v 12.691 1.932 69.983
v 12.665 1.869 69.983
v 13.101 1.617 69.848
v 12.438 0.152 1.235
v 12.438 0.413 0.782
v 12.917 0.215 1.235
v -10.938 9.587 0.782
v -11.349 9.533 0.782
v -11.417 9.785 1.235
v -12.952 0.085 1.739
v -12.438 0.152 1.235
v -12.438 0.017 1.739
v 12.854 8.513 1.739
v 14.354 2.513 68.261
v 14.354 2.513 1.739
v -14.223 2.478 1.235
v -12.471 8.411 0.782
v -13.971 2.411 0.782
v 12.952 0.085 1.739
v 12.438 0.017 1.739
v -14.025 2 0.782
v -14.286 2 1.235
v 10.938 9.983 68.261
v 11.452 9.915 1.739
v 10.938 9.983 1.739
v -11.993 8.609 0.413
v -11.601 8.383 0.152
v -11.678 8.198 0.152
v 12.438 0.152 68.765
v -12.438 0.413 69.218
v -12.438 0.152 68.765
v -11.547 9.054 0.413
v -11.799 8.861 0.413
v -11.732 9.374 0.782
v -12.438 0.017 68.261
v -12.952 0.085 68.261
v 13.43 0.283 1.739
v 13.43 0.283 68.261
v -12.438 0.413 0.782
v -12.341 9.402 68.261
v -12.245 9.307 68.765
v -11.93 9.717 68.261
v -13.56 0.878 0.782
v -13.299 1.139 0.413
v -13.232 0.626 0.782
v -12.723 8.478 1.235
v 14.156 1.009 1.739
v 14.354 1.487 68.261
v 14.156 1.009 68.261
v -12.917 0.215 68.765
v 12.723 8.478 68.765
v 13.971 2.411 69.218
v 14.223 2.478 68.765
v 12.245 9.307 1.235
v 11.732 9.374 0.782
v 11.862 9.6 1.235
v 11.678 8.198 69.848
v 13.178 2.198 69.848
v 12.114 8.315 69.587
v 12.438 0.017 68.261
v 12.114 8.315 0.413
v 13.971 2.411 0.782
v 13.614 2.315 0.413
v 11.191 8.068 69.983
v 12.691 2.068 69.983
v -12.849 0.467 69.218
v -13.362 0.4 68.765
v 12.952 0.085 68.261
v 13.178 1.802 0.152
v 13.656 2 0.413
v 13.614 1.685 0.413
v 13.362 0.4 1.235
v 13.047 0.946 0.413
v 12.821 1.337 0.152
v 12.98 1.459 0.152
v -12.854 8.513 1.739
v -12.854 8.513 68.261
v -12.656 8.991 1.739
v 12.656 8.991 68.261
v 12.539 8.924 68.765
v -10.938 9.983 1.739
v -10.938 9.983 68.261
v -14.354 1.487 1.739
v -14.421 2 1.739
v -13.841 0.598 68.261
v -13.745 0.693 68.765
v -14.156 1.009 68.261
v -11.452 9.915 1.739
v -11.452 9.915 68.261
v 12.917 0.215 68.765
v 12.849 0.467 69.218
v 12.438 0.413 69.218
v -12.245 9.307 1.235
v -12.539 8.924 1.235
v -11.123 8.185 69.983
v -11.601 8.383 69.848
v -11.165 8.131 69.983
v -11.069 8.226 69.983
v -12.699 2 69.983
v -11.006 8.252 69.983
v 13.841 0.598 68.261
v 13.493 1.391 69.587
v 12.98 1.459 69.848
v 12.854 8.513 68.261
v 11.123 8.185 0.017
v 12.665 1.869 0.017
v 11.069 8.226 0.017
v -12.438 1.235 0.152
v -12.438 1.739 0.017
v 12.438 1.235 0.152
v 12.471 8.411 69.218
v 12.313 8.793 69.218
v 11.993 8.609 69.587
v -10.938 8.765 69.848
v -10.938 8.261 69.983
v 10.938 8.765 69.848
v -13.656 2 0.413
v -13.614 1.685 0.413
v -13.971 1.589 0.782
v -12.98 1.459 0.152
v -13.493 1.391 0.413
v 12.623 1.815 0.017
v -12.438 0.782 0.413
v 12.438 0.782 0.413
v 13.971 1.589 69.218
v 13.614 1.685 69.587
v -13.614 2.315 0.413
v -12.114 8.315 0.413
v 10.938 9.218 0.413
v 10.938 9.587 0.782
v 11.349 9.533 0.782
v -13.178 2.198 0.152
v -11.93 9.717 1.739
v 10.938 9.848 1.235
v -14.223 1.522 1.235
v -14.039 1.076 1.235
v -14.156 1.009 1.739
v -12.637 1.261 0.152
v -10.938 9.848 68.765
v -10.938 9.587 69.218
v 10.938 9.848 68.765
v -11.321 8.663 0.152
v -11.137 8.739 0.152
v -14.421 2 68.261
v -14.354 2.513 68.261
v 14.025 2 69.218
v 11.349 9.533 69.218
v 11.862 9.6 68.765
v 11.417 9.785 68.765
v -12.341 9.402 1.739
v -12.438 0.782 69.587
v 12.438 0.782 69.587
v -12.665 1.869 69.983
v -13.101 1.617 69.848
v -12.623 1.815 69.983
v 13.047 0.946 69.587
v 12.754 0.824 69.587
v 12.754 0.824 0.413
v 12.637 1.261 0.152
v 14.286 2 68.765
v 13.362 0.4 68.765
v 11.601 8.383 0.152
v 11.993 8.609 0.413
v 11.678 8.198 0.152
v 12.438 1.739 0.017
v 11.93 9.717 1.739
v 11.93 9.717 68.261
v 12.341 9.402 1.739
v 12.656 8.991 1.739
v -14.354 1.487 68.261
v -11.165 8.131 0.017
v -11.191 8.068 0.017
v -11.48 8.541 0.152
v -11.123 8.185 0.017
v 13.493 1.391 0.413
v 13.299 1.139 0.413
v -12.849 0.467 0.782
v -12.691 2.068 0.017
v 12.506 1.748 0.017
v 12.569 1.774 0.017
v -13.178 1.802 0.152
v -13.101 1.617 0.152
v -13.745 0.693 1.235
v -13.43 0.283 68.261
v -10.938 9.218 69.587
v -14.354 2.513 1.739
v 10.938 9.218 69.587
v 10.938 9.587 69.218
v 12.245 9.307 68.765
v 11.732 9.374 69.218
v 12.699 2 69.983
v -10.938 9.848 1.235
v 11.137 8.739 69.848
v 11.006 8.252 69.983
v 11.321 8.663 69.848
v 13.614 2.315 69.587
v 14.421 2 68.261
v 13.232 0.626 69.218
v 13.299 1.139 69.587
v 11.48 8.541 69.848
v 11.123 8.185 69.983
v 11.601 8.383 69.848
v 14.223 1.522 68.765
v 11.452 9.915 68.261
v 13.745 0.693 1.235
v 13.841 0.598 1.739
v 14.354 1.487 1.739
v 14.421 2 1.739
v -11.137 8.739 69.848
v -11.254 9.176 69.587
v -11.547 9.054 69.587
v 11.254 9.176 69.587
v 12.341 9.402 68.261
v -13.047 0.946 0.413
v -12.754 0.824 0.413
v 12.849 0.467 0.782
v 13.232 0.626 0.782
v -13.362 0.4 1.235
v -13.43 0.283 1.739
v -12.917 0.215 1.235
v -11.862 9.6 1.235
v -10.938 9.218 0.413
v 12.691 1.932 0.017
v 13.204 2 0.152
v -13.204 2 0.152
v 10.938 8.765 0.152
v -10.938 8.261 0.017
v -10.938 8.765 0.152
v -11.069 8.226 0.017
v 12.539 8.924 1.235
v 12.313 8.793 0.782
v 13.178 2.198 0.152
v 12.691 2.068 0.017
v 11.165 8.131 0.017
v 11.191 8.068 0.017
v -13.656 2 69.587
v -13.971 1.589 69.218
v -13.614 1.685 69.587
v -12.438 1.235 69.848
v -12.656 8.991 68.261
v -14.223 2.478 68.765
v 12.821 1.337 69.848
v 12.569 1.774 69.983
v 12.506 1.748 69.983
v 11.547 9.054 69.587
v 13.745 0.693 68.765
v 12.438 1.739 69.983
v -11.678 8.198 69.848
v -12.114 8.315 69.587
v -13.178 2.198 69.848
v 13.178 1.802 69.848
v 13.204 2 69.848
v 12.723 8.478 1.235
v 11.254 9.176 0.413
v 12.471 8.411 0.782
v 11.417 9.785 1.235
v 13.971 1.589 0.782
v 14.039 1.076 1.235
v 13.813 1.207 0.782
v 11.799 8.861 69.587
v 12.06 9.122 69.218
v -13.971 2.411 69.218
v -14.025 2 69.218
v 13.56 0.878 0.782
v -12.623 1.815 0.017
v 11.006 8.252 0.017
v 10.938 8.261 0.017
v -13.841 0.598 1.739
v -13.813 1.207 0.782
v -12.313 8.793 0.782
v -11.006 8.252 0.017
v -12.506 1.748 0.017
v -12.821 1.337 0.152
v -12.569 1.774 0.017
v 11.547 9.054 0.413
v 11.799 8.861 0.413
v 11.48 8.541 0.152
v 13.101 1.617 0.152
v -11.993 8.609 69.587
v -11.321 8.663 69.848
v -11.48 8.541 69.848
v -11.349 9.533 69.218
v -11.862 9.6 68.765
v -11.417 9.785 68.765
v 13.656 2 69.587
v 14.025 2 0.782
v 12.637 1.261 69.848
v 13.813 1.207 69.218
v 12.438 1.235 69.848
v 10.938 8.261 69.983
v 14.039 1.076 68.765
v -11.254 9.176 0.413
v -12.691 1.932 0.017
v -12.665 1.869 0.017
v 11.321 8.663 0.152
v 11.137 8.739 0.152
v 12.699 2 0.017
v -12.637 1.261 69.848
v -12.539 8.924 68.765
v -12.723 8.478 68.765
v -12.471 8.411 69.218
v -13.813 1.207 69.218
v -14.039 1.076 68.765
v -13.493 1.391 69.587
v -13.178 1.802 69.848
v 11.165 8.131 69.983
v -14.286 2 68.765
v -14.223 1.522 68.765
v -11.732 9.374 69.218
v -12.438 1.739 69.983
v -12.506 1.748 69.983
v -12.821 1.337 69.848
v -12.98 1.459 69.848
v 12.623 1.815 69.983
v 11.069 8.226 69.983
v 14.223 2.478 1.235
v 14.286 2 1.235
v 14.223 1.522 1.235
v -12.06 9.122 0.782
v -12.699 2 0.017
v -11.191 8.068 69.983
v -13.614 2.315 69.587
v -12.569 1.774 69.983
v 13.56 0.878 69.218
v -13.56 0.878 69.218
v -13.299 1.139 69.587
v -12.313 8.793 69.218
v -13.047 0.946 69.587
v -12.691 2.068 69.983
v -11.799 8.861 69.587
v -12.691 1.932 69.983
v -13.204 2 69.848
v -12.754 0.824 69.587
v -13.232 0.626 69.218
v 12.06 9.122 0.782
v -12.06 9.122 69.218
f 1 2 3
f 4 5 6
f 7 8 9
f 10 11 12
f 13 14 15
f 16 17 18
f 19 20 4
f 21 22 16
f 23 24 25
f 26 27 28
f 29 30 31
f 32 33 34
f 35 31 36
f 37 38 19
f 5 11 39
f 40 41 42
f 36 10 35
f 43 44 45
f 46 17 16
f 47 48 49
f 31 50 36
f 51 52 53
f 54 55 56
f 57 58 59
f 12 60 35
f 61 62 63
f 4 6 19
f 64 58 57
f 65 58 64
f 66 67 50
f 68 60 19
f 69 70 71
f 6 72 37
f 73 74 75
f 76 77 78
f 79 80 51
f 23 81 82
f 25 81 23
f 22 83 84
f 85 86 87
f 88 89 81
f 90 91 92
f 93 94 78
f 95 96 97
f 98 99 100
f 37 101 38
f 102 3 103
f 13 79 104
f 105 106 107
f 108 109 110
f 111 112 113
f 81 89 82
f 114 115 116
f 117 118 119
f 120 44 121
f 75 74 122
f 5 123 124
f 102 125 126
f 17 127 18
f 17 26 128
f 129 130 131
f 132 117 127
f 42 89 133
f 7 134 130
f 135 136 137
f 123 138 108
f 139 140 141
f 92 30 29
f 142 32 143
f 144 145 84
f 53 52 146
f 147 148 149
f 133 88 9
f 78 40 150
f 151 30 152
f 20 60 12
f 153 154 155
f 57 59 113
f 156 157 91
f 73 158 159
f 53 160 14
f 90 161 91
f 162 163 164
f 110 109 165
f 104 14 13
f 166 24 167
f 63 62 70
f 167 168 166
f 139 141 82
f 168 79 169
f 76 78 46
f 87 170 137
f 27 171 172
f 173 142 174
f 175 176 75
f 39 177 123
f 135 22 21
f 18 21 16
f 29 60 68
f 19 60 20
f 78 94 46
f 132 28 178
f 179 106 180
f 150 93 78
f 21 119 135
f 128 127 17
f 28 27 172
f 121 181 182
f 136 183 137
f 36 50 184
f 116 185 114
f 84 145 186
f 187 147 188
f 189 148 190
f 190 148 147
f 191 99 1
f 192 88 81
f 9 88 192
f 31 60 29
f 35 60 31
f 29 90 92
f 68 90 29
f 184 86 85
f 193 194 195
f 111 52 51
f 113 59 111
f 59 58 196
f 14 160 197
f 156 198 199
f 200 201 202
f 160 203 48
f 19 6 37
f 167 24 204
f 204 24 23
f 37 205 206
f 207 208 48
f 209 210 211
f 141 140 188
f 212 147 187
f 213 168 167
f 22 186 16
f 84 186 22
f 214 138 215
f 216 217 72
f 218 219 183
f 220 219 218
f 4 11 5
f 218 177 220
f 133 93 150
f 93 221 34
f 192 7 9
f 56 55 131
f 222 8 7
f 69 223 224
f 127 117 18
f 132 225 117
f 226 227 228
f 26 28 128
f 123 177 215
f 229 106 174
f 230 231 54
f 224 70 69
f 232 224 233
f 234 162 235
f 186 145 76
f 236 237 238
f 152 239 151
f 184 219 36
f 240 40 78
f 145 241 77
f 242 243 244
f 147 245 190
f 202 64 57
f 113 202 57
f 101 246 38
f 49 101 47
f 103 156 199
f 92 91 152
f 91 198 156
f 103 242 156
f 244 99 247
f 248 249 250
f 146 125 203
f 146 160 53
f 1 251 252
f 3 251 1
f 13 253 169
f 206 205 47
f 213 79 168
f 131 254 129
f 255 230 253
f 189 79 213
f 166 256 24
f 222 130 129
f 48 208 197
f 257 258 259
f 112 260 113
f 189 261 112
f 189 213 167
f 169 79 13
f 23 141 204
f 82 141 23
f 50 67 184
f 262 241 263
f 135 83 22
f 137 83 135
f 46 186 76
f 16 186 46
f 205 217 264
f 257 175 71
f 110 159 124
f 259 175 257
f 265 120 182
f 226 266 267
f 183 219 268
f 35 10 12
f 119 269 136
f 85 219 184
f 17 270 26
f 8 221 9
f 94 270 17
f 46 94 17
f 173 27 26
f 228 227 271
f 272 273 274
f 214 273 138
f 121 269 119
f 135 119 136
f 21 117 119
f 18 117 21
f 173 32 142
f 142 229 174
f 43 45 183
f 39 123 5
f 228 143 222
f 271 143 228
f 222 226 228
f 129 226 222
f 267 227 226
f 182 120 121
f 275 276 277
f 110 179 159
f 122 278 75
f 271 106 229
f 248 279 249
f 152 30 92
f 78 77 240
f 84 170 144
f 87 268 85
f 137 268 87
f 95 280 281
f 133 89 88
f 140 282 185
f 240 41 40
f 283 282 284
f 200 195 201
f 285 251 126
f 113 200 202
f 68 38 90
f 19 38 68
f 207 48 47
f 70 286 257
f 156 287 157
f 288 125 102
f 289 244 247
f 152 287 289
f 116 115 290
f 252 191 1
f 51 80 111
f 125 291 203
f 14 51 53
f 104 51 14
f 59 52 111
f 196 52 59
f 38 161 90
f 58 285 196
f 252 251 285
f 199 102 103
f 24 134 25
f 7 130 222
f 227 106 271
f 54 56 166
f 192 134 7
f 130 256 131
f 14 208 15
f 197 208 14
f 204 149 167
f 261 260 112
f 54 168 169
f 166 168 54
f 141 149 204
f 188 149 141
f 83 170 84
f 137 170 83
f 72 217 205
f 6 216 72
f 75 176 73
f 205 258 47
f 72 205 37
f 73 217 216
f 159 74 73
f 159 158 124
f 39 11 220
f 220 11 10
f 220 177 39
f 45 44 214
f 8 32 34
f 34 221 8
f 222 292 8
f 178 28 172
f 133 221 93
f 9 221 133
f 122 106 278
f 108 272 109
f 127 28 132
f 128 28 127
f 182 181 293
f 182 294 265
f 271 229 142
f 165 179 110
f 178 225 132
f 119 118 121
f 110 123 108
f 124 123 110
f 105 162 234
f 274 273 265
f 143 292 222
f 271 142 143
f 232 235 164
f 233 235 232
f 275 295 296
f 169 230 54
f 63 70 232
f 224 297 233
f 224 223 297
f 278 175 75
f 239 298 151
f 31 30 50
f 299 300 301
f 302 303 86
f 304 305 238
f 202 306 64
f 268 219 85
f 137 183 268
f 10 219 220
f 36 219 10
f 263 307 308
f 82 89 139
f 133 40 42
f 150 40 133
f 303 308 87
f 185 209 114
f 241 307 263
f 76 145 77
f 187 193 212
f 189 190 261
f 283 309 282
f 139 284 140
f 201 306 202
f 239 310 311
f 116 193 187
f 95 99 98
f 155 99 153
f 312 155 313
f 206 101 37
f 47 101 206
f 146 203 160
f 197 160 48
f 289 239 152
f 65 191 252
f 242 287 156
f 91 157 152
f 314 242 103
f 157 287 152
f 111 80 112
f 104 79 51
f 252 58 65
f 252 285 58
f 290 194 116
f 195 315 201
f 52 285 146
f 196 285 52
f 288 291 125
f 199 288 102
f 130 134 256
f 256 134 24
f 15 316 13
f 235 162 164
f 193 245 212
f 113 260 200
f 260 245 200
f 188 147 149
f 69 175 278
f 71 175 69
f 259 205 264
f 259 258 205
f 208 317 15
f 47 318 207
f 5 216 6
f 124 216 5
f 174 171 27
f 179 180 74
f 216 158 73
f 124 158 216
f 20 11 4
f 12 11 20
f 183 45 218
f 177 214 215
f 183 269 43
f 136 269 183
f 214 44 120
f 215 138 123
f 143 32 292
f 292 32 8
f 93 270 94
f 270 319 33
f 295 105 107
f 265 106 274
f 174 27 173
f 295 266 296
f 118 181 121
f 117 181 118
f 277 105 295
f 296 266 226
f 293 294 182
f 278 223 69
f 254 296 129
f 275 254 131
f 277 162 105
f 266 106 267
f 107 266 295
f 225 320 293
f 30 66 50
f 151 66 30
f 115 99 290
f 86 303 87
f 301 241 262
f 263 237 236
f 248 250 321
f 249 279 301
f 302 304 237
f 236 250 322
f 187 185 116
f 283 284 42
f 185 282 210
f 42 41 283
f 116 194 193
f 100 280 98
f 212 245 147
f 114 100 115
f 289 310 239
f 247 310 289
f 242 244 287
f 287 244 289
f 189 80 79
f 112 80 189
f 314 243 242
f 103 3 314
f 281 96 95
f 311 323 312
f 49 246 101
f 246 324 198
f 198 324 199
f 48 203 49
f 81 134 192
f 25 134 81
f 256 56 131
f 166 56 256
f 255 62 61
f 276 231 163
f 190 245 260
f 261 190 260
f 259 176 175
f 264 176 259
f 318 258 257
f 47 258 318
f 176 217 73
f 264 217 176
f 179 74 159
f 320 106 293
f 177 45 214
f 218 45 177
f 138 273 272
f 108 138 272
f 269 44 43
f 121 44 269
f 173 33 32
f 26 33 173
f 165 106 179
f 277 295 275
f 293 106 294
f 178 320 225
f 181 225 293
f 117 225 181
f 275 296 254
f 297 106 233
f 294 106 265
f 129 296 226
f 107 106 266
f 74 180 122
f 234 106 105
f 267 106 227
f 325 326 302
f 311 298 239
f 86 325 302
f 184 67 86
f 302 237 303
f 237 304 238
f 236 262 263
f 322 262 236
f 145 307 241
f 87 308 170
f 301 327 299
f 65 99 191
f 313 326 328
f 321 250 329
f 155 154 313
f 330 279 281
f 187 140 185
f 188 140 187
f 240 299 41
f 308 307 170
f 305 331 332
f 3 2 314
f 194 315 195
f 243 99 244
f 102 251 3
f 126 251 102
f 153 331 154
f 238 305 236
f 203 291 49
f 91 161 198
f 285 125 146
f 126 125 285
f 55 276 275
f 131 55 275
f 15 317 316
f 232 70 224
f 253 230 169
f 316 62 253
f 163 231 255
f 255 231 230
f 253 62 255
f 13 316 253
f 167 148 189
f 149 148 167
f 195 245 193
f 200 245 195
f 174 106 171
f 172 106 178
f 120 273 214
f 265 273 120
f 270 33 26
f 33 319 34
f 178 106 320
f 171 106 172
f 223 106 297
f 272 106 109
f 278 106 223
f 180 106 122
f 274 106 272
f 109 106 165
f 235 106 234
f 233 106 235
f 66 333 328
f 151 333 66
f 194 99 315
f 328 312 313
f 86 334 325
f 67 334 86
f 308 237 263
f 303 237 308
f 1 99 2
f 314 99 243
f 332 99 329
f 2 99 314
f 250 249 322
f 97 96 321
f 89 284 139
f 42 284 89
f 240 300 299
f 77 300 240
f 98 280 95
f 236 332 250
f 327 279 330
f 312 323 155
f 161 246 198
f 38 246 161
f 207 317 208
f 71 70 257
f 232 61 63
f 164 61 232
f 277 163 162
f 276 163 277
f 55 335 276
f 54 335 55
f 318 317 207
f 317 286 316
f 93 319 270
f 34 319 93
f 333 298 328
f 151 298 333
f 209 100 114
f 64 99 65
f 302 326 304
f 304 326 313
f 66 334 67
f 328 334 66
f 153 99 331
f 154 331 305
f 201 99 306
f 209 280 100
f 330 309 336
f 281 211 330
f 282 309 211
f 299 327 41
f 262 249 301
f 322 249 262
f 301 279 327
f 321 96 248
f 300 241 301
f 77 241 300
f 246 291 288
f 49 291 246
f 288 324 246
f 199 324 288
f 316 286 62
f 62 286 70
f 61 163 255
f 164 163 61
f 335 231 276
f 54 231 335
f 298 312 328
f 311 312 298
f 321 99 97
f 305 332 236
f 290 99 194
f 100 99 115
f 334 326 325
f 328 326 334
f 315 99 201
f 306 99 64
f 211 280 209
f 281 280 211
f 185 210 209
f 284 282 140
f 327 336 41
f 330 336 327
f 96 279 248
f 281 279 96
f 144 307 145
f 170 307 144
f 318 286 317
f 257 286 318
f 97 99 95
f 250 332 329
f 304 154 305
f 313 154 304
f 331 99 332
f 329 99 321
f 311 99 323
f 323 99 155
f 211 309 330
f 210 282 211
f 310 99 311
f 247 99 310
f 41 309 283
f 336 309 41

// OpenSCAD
// ============================================================
// Parametrized Trapezoid (Minkowski-rounded)
// ============================================================
// A trapezoid has two parallel sides (bottom and top) of
// different lengths, separated by a height. This module builds
// the 2D profile, extrudes it, then rounds every edge/corner
// with a Minkowski sum against a sphere.

// ---------- Parameters ----------
bottom_width = 30;   // length of the bottom parallel side
top_width    = 25;   // length of the top parallel side
height       = 10;   // perpendicular distance between the two sides
thickness    = 70;   // extrusion depth (set 0 for a flat 2D shape)
top_offset   = 0;    // horizontal shift of the top side.
                     //   0        = symmetric (isosceles) trapezoid
                     //   any value = fully asymmetric

center_x = true;     // center the shape on the X axis

// ---------- Rounding ----------
round_radius = 2;    // Minkowski sphere radius (0 = sharp edges)
sphere_fn    = 24;   // facets on the rounding sphere (higher = smoother, slower)

// ---------- Module: flat 2D profile ----------
module trapezoid(bottom, top, h, offset = 0, center = true) {
    bl = [0, 0];
    br = [bottom, 0];
    top_start = (bottom - top) / 2 + offset;
    tl = [top_start,       h];
    tr = [top_start + top, h];
    dx = center ? -bottom / 2 : 0;
    translate([dx, 0])
        polygon(points = [bl, br, tr, tl]);
}

// ---------- Module: rounded solid ----------
module trapezoid_solid(bottom, top, h, thick, offset, center, r, sfn) {
    if (r > 0 && thick > 2 * r) {
        // Inset the profile by r and shorten the extrusion by 2r so the
        // Minkowski sphere grows the shape back to its nominal size.
        translate([0, 0, r])
            minkowski() {
                linear_extrude(height = thick - 2 * r)
                    offset(r = -r)
                        trapezoid(bottom, top, h, offset, center);
                sphere(r = r, $fn = sfn);
            }
    } else {
        // No rounding (or radius too large for the geometry): plain extrude.
        linear_extrude(height = thick)
            trapezoid(bottom, top, h, offset, center);
    }
}

// ---------- Build ----------
if (thickness > 0) {
    trapezoid_solid(bottom_width, top_width, height, thickness,
                    top_offset, center_x, round_radius, sphere_fn);
} else {
    // Flat 2D: round the profile outline only.
    offset(r = round_radius)
        offset(r = -round_radius)
            trapezoid(bottom_width, top_width, height, top_offset, center_x);
}
